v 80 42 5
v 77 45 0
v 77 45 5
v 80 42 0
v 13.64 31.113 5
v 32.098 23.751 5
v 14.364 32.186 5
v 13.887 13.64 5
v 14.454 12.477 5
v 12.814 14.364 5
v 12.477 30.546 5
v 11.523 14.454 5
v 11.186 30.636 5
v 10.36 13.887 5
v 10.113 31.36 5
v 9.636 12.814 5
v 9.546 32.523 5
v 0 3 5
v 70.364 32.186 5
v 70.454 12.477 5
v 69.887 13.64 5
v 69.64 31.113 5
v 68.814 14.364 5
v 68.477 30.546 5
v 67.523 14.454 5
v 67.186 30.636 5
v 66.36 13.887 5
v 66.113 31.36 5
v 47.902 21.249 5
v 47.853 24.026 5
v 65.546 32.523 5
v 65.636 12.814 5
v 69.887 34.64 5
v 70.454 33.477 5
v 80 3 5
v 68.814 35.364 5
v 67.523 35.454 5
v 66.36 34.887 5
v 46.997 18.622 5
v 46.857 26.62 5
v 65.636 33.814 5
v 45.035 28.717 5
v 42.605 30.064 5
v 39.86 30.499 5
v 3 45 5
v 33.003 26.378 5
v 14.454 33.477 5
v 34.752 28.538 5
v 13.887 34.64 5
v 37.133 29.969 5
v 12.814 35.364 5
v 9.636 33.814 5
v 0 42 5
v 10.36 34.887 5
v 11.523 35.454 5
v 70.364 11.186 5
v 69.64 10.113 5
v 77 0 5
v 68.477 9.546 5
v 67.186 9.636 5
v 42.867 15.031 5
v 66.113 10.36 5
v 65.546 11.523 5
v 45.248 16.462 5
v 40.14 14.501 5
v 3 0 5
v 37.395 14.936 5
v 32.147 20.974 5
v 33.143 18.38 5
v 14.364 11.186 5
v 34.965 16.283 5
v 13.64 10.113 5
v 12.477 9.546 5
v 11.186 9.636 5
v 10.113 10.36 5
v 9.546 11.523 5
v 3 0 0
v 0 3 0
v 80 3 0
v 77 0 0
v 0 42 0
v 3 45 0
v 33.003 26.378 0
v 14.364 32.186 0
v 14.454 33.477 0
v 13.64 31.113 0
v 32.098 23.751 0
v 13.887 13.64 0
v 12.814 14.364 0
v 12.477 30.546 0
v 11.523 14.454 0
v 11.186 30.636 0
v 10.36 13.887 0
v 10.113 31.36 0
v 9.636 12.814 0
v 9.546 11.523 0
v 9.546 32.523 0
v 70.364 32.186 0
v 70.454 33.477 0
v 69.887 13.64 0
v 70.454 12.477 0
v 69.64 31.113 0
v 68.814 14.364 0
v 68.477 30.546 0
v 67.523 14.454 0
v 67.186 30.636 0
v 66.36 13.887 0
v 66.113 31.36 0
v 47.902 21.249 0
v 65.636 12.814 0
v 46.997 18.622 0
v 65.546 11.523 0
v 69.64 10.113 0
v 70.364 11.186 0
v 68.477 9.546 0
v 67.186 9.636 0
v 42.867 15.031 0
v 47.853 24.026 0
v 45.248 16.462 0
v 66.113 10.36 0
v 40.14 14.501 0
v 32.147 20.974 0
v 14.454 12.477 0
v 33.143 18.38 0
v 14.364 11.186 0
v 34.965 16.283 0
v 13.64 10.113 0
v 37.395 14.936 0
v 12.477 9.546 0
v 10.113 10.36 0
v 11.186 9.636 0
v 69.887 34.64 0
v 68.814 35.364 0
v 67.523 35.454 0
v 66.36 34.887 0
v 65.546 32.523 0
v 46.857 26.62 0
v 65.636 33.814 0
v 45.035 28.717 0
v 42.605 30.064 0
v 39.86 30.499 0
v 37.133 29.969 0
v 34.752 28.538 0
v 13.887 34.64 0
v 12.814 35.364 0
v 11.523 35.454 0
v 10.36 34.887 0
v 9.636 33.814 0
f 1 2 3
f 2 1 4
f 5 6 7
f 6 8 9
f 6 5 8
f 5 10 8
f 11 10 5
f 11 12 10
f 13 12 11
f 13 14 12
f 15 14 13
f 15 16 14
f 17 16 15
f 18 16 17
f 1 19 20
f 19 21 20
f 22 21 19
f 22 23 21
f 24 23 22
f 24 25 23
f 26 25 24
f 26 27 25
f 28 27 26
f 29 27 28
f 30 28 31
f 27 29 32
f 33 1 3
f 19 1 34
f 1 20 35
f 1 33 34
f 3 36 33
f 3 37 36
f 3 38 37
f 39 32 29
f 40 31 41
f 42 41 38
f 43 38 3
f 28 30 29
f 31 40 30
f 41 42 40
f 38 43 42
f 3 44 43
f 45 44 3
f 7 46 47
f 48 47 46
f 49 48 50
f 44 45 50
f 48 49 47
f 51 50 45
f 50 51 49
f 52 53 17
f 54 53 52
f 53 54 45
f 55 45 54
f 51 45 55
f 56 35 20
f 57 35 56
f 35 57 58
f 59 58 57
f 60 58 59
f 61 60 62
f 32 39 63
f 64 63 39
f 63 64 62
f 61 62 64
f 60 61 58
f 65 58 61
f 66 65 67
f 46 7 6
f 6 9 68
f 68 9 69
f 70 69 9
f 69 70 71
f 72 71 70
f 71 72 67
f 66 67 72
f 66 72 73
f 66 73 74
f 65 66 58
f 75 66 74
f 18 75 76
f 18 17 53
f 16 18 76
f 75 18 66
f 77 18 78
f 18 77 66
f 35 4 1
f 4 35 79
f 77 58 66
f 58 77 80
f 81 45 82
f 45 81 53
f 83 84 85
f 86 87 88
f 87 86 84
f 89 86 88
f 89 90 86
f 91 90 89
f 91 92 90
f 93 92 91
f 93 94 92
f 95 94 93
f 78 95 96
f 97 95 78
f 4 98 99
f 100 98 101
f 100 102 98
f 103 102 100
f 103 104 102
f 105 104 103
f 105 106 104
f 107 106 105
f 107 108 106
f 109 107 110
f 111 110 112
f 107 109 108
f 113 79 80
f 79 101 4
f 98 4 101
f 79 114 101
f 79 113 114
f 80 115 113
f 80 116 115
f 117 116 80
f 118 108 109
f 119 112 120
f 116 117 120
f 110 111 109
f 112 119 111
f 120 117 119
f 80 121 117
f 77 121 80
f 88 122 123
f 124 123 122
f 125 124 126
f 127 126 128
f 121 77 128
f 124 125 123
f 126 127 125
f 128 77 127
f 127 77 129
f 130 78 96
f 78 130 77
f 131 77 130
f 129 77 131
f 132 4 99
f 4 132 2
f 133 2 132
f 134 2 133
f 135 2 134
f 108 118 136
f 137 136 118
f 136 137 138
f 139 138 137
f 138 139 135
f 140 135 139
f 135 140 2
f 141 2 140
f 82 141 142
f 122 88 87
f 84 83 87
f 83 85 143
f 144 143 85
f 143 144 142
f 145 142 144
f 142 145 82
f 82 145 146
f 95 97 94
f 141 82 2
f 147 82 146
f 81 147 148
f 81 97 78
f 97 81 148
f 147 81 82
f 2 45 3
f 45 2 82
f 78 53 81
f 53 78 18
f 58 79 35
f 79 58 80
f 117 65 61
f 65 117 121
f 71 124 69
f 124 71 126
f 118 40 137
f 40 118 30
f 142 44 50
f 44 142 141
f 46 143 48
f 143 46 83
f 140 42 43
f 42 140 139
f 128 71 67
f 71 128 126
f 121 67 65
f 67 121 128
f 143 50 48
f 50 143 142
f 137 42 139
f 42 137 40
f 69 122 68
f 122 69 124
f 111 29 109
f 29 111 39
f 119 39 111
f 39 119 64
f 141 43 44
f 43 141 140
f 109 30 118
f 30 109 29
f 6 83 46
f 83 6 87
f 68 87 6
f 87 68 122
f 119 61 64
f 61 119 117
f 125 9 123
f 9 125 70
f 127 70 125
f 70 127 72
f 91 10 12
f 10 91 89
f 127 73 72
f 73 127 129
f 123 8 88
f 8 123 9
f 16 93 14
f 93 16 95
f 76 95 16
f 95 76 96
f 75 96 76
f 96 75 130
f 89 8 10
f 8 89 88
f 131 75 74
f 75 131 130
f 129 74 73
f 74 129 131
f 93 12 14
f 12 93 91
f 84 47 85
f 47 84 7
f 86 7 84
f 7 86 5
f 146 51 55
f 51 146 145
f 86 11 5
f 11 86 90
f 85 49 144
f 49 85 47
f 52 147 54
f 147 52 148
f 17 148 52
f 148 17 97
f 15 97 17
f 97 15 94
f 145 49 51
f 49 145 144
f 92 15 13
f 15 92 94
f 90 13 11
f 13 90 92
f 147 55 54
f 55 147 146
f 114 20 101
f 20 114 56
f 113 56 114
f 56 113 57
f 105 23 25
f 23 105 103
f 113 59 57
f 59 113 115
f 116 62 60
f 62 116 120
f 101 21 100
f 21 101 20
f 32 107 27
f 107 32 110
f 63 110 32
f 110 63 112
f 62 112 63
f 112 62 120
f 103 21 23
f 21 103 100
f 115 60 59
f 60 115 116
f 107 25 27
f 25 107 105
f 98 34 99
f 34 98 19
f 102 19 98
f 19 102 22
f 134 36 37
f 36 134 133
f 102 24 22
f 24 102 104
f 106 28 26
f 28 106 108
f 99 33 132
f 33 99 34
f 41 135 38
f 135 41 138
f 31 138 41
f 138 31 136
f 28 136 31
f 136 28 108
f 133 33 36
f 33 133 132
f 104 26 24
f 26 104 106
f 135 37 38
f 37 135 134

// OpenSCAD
$fn = 32;

// ----------------------------------------------------------------------
// Spacer plate: rect 80 x 45
// ----------------------------------------------------------------------

// --- parameters (mm) ---
bore_r = 8;               // centre bore radius
bolt_r = 2.5;             // bolt hole radius
plate_t = 5;              // plate thickness, Z (extrusion height)
plate_l = 80;             // plate length, X
plate_w = 45;             // plate width, Y
inset = 12;               // corner hole inset
fit_tol = 0.02;           // declared fit tolerance (prompt contract)
free_tol = 0.2;           // declared free tolerance (prompt contract)

profile = [[3, 0], [77, 0], [80, 3], [80, 42], [77, 45], [3, 45], [0, 42], [0, 3]];  // primary outline, 8 points, counter clockwise
void_1 = [[47.853, 24.026], [46.857, 26.62], [45.035, 28.717], [42.605, 30.064], [39.86, 30.499], [37.133, 29.969], [34.752, 28.538], [33.003, 26.378], [32.098, 23.751], [32.147, 20.974], [33.143, 18.38], [34.965, 16.283], [37.395, 14.936], [40.14, 14.501], [42.867, 15.031], [45.248, 16.462], [46.997, 18.622], [47.902, 21.249]];  // centre bore, 18 points
void_2 = [[14.454, 12.477], [13.887, 13.64], [12.814, 14.364], [11.523, 14.454], [10.36, 13.887], [9.636, 12.814], [9.546, 11.523], [10.113, 10.36], [11.186, 9.636], [12.477, 9.546], [13.64, 10.113], [14.364, 11.186]];  // corner hole, 12 points
void_3 = [[14.454, 33.477], [13.887, 34.64], [12.814, 35.364], [11.523, 35.454], [10.36, 34.887], [9.636, 33.814], [9.546, 32.523], [10.113, 31.36], [11.186, 30.636], [12.477, 30.546], [13.64, 31.113], [14.364, 32.186]];  // corner hole, 12 points
void_4 = [[70.454, 12.477], [69.887, 13.64], [68.814, 14.364], [67.523, 14.454], [66.36, 13.887], [65.636, 12.814], [65.546, 11.523], [66.113, 10.36], [67.186, 9.636], [68.477, 9.546], [69.64, 10.113], [70.364, 11.186]];  // corner hole, 12 points
void_5 = [[70.454, 33.477], [69.887, 34.64], [68.814, 35.364], [67.523, 35.454], [66.36, 34.887], [65.636, 33.814], [65.546, 32.523], [66.113, 31.36], [67.186, 30.636], [68.477, 30.546], [69.64, 31.113], [70.364, 32.186]];  // corner hole, 12 points

// --- the one profile operation ---
difference() {
  linear_extrude(height = plate_t) polygon(points = profile);
  translate([0, 0, -1])
    linear_extrude(height = plate_t + 2) polygon(points = void_1);
  translate([0, 0, -1])
    linear_extrude(height = plate_t + 2) polygon(points = void_2);
  translate([0, 0, -1])
    linear_extrude(height = plate_t + 2) polygon(points = void_3);
  translate([0, 0, -1])
    linear_extrude(height = plate_t + 2) polygon(points = void_4);
  translate([0, 0, -1])
    linear_extrude(height = plate_t + 2) polygon(points = void_5);
}
